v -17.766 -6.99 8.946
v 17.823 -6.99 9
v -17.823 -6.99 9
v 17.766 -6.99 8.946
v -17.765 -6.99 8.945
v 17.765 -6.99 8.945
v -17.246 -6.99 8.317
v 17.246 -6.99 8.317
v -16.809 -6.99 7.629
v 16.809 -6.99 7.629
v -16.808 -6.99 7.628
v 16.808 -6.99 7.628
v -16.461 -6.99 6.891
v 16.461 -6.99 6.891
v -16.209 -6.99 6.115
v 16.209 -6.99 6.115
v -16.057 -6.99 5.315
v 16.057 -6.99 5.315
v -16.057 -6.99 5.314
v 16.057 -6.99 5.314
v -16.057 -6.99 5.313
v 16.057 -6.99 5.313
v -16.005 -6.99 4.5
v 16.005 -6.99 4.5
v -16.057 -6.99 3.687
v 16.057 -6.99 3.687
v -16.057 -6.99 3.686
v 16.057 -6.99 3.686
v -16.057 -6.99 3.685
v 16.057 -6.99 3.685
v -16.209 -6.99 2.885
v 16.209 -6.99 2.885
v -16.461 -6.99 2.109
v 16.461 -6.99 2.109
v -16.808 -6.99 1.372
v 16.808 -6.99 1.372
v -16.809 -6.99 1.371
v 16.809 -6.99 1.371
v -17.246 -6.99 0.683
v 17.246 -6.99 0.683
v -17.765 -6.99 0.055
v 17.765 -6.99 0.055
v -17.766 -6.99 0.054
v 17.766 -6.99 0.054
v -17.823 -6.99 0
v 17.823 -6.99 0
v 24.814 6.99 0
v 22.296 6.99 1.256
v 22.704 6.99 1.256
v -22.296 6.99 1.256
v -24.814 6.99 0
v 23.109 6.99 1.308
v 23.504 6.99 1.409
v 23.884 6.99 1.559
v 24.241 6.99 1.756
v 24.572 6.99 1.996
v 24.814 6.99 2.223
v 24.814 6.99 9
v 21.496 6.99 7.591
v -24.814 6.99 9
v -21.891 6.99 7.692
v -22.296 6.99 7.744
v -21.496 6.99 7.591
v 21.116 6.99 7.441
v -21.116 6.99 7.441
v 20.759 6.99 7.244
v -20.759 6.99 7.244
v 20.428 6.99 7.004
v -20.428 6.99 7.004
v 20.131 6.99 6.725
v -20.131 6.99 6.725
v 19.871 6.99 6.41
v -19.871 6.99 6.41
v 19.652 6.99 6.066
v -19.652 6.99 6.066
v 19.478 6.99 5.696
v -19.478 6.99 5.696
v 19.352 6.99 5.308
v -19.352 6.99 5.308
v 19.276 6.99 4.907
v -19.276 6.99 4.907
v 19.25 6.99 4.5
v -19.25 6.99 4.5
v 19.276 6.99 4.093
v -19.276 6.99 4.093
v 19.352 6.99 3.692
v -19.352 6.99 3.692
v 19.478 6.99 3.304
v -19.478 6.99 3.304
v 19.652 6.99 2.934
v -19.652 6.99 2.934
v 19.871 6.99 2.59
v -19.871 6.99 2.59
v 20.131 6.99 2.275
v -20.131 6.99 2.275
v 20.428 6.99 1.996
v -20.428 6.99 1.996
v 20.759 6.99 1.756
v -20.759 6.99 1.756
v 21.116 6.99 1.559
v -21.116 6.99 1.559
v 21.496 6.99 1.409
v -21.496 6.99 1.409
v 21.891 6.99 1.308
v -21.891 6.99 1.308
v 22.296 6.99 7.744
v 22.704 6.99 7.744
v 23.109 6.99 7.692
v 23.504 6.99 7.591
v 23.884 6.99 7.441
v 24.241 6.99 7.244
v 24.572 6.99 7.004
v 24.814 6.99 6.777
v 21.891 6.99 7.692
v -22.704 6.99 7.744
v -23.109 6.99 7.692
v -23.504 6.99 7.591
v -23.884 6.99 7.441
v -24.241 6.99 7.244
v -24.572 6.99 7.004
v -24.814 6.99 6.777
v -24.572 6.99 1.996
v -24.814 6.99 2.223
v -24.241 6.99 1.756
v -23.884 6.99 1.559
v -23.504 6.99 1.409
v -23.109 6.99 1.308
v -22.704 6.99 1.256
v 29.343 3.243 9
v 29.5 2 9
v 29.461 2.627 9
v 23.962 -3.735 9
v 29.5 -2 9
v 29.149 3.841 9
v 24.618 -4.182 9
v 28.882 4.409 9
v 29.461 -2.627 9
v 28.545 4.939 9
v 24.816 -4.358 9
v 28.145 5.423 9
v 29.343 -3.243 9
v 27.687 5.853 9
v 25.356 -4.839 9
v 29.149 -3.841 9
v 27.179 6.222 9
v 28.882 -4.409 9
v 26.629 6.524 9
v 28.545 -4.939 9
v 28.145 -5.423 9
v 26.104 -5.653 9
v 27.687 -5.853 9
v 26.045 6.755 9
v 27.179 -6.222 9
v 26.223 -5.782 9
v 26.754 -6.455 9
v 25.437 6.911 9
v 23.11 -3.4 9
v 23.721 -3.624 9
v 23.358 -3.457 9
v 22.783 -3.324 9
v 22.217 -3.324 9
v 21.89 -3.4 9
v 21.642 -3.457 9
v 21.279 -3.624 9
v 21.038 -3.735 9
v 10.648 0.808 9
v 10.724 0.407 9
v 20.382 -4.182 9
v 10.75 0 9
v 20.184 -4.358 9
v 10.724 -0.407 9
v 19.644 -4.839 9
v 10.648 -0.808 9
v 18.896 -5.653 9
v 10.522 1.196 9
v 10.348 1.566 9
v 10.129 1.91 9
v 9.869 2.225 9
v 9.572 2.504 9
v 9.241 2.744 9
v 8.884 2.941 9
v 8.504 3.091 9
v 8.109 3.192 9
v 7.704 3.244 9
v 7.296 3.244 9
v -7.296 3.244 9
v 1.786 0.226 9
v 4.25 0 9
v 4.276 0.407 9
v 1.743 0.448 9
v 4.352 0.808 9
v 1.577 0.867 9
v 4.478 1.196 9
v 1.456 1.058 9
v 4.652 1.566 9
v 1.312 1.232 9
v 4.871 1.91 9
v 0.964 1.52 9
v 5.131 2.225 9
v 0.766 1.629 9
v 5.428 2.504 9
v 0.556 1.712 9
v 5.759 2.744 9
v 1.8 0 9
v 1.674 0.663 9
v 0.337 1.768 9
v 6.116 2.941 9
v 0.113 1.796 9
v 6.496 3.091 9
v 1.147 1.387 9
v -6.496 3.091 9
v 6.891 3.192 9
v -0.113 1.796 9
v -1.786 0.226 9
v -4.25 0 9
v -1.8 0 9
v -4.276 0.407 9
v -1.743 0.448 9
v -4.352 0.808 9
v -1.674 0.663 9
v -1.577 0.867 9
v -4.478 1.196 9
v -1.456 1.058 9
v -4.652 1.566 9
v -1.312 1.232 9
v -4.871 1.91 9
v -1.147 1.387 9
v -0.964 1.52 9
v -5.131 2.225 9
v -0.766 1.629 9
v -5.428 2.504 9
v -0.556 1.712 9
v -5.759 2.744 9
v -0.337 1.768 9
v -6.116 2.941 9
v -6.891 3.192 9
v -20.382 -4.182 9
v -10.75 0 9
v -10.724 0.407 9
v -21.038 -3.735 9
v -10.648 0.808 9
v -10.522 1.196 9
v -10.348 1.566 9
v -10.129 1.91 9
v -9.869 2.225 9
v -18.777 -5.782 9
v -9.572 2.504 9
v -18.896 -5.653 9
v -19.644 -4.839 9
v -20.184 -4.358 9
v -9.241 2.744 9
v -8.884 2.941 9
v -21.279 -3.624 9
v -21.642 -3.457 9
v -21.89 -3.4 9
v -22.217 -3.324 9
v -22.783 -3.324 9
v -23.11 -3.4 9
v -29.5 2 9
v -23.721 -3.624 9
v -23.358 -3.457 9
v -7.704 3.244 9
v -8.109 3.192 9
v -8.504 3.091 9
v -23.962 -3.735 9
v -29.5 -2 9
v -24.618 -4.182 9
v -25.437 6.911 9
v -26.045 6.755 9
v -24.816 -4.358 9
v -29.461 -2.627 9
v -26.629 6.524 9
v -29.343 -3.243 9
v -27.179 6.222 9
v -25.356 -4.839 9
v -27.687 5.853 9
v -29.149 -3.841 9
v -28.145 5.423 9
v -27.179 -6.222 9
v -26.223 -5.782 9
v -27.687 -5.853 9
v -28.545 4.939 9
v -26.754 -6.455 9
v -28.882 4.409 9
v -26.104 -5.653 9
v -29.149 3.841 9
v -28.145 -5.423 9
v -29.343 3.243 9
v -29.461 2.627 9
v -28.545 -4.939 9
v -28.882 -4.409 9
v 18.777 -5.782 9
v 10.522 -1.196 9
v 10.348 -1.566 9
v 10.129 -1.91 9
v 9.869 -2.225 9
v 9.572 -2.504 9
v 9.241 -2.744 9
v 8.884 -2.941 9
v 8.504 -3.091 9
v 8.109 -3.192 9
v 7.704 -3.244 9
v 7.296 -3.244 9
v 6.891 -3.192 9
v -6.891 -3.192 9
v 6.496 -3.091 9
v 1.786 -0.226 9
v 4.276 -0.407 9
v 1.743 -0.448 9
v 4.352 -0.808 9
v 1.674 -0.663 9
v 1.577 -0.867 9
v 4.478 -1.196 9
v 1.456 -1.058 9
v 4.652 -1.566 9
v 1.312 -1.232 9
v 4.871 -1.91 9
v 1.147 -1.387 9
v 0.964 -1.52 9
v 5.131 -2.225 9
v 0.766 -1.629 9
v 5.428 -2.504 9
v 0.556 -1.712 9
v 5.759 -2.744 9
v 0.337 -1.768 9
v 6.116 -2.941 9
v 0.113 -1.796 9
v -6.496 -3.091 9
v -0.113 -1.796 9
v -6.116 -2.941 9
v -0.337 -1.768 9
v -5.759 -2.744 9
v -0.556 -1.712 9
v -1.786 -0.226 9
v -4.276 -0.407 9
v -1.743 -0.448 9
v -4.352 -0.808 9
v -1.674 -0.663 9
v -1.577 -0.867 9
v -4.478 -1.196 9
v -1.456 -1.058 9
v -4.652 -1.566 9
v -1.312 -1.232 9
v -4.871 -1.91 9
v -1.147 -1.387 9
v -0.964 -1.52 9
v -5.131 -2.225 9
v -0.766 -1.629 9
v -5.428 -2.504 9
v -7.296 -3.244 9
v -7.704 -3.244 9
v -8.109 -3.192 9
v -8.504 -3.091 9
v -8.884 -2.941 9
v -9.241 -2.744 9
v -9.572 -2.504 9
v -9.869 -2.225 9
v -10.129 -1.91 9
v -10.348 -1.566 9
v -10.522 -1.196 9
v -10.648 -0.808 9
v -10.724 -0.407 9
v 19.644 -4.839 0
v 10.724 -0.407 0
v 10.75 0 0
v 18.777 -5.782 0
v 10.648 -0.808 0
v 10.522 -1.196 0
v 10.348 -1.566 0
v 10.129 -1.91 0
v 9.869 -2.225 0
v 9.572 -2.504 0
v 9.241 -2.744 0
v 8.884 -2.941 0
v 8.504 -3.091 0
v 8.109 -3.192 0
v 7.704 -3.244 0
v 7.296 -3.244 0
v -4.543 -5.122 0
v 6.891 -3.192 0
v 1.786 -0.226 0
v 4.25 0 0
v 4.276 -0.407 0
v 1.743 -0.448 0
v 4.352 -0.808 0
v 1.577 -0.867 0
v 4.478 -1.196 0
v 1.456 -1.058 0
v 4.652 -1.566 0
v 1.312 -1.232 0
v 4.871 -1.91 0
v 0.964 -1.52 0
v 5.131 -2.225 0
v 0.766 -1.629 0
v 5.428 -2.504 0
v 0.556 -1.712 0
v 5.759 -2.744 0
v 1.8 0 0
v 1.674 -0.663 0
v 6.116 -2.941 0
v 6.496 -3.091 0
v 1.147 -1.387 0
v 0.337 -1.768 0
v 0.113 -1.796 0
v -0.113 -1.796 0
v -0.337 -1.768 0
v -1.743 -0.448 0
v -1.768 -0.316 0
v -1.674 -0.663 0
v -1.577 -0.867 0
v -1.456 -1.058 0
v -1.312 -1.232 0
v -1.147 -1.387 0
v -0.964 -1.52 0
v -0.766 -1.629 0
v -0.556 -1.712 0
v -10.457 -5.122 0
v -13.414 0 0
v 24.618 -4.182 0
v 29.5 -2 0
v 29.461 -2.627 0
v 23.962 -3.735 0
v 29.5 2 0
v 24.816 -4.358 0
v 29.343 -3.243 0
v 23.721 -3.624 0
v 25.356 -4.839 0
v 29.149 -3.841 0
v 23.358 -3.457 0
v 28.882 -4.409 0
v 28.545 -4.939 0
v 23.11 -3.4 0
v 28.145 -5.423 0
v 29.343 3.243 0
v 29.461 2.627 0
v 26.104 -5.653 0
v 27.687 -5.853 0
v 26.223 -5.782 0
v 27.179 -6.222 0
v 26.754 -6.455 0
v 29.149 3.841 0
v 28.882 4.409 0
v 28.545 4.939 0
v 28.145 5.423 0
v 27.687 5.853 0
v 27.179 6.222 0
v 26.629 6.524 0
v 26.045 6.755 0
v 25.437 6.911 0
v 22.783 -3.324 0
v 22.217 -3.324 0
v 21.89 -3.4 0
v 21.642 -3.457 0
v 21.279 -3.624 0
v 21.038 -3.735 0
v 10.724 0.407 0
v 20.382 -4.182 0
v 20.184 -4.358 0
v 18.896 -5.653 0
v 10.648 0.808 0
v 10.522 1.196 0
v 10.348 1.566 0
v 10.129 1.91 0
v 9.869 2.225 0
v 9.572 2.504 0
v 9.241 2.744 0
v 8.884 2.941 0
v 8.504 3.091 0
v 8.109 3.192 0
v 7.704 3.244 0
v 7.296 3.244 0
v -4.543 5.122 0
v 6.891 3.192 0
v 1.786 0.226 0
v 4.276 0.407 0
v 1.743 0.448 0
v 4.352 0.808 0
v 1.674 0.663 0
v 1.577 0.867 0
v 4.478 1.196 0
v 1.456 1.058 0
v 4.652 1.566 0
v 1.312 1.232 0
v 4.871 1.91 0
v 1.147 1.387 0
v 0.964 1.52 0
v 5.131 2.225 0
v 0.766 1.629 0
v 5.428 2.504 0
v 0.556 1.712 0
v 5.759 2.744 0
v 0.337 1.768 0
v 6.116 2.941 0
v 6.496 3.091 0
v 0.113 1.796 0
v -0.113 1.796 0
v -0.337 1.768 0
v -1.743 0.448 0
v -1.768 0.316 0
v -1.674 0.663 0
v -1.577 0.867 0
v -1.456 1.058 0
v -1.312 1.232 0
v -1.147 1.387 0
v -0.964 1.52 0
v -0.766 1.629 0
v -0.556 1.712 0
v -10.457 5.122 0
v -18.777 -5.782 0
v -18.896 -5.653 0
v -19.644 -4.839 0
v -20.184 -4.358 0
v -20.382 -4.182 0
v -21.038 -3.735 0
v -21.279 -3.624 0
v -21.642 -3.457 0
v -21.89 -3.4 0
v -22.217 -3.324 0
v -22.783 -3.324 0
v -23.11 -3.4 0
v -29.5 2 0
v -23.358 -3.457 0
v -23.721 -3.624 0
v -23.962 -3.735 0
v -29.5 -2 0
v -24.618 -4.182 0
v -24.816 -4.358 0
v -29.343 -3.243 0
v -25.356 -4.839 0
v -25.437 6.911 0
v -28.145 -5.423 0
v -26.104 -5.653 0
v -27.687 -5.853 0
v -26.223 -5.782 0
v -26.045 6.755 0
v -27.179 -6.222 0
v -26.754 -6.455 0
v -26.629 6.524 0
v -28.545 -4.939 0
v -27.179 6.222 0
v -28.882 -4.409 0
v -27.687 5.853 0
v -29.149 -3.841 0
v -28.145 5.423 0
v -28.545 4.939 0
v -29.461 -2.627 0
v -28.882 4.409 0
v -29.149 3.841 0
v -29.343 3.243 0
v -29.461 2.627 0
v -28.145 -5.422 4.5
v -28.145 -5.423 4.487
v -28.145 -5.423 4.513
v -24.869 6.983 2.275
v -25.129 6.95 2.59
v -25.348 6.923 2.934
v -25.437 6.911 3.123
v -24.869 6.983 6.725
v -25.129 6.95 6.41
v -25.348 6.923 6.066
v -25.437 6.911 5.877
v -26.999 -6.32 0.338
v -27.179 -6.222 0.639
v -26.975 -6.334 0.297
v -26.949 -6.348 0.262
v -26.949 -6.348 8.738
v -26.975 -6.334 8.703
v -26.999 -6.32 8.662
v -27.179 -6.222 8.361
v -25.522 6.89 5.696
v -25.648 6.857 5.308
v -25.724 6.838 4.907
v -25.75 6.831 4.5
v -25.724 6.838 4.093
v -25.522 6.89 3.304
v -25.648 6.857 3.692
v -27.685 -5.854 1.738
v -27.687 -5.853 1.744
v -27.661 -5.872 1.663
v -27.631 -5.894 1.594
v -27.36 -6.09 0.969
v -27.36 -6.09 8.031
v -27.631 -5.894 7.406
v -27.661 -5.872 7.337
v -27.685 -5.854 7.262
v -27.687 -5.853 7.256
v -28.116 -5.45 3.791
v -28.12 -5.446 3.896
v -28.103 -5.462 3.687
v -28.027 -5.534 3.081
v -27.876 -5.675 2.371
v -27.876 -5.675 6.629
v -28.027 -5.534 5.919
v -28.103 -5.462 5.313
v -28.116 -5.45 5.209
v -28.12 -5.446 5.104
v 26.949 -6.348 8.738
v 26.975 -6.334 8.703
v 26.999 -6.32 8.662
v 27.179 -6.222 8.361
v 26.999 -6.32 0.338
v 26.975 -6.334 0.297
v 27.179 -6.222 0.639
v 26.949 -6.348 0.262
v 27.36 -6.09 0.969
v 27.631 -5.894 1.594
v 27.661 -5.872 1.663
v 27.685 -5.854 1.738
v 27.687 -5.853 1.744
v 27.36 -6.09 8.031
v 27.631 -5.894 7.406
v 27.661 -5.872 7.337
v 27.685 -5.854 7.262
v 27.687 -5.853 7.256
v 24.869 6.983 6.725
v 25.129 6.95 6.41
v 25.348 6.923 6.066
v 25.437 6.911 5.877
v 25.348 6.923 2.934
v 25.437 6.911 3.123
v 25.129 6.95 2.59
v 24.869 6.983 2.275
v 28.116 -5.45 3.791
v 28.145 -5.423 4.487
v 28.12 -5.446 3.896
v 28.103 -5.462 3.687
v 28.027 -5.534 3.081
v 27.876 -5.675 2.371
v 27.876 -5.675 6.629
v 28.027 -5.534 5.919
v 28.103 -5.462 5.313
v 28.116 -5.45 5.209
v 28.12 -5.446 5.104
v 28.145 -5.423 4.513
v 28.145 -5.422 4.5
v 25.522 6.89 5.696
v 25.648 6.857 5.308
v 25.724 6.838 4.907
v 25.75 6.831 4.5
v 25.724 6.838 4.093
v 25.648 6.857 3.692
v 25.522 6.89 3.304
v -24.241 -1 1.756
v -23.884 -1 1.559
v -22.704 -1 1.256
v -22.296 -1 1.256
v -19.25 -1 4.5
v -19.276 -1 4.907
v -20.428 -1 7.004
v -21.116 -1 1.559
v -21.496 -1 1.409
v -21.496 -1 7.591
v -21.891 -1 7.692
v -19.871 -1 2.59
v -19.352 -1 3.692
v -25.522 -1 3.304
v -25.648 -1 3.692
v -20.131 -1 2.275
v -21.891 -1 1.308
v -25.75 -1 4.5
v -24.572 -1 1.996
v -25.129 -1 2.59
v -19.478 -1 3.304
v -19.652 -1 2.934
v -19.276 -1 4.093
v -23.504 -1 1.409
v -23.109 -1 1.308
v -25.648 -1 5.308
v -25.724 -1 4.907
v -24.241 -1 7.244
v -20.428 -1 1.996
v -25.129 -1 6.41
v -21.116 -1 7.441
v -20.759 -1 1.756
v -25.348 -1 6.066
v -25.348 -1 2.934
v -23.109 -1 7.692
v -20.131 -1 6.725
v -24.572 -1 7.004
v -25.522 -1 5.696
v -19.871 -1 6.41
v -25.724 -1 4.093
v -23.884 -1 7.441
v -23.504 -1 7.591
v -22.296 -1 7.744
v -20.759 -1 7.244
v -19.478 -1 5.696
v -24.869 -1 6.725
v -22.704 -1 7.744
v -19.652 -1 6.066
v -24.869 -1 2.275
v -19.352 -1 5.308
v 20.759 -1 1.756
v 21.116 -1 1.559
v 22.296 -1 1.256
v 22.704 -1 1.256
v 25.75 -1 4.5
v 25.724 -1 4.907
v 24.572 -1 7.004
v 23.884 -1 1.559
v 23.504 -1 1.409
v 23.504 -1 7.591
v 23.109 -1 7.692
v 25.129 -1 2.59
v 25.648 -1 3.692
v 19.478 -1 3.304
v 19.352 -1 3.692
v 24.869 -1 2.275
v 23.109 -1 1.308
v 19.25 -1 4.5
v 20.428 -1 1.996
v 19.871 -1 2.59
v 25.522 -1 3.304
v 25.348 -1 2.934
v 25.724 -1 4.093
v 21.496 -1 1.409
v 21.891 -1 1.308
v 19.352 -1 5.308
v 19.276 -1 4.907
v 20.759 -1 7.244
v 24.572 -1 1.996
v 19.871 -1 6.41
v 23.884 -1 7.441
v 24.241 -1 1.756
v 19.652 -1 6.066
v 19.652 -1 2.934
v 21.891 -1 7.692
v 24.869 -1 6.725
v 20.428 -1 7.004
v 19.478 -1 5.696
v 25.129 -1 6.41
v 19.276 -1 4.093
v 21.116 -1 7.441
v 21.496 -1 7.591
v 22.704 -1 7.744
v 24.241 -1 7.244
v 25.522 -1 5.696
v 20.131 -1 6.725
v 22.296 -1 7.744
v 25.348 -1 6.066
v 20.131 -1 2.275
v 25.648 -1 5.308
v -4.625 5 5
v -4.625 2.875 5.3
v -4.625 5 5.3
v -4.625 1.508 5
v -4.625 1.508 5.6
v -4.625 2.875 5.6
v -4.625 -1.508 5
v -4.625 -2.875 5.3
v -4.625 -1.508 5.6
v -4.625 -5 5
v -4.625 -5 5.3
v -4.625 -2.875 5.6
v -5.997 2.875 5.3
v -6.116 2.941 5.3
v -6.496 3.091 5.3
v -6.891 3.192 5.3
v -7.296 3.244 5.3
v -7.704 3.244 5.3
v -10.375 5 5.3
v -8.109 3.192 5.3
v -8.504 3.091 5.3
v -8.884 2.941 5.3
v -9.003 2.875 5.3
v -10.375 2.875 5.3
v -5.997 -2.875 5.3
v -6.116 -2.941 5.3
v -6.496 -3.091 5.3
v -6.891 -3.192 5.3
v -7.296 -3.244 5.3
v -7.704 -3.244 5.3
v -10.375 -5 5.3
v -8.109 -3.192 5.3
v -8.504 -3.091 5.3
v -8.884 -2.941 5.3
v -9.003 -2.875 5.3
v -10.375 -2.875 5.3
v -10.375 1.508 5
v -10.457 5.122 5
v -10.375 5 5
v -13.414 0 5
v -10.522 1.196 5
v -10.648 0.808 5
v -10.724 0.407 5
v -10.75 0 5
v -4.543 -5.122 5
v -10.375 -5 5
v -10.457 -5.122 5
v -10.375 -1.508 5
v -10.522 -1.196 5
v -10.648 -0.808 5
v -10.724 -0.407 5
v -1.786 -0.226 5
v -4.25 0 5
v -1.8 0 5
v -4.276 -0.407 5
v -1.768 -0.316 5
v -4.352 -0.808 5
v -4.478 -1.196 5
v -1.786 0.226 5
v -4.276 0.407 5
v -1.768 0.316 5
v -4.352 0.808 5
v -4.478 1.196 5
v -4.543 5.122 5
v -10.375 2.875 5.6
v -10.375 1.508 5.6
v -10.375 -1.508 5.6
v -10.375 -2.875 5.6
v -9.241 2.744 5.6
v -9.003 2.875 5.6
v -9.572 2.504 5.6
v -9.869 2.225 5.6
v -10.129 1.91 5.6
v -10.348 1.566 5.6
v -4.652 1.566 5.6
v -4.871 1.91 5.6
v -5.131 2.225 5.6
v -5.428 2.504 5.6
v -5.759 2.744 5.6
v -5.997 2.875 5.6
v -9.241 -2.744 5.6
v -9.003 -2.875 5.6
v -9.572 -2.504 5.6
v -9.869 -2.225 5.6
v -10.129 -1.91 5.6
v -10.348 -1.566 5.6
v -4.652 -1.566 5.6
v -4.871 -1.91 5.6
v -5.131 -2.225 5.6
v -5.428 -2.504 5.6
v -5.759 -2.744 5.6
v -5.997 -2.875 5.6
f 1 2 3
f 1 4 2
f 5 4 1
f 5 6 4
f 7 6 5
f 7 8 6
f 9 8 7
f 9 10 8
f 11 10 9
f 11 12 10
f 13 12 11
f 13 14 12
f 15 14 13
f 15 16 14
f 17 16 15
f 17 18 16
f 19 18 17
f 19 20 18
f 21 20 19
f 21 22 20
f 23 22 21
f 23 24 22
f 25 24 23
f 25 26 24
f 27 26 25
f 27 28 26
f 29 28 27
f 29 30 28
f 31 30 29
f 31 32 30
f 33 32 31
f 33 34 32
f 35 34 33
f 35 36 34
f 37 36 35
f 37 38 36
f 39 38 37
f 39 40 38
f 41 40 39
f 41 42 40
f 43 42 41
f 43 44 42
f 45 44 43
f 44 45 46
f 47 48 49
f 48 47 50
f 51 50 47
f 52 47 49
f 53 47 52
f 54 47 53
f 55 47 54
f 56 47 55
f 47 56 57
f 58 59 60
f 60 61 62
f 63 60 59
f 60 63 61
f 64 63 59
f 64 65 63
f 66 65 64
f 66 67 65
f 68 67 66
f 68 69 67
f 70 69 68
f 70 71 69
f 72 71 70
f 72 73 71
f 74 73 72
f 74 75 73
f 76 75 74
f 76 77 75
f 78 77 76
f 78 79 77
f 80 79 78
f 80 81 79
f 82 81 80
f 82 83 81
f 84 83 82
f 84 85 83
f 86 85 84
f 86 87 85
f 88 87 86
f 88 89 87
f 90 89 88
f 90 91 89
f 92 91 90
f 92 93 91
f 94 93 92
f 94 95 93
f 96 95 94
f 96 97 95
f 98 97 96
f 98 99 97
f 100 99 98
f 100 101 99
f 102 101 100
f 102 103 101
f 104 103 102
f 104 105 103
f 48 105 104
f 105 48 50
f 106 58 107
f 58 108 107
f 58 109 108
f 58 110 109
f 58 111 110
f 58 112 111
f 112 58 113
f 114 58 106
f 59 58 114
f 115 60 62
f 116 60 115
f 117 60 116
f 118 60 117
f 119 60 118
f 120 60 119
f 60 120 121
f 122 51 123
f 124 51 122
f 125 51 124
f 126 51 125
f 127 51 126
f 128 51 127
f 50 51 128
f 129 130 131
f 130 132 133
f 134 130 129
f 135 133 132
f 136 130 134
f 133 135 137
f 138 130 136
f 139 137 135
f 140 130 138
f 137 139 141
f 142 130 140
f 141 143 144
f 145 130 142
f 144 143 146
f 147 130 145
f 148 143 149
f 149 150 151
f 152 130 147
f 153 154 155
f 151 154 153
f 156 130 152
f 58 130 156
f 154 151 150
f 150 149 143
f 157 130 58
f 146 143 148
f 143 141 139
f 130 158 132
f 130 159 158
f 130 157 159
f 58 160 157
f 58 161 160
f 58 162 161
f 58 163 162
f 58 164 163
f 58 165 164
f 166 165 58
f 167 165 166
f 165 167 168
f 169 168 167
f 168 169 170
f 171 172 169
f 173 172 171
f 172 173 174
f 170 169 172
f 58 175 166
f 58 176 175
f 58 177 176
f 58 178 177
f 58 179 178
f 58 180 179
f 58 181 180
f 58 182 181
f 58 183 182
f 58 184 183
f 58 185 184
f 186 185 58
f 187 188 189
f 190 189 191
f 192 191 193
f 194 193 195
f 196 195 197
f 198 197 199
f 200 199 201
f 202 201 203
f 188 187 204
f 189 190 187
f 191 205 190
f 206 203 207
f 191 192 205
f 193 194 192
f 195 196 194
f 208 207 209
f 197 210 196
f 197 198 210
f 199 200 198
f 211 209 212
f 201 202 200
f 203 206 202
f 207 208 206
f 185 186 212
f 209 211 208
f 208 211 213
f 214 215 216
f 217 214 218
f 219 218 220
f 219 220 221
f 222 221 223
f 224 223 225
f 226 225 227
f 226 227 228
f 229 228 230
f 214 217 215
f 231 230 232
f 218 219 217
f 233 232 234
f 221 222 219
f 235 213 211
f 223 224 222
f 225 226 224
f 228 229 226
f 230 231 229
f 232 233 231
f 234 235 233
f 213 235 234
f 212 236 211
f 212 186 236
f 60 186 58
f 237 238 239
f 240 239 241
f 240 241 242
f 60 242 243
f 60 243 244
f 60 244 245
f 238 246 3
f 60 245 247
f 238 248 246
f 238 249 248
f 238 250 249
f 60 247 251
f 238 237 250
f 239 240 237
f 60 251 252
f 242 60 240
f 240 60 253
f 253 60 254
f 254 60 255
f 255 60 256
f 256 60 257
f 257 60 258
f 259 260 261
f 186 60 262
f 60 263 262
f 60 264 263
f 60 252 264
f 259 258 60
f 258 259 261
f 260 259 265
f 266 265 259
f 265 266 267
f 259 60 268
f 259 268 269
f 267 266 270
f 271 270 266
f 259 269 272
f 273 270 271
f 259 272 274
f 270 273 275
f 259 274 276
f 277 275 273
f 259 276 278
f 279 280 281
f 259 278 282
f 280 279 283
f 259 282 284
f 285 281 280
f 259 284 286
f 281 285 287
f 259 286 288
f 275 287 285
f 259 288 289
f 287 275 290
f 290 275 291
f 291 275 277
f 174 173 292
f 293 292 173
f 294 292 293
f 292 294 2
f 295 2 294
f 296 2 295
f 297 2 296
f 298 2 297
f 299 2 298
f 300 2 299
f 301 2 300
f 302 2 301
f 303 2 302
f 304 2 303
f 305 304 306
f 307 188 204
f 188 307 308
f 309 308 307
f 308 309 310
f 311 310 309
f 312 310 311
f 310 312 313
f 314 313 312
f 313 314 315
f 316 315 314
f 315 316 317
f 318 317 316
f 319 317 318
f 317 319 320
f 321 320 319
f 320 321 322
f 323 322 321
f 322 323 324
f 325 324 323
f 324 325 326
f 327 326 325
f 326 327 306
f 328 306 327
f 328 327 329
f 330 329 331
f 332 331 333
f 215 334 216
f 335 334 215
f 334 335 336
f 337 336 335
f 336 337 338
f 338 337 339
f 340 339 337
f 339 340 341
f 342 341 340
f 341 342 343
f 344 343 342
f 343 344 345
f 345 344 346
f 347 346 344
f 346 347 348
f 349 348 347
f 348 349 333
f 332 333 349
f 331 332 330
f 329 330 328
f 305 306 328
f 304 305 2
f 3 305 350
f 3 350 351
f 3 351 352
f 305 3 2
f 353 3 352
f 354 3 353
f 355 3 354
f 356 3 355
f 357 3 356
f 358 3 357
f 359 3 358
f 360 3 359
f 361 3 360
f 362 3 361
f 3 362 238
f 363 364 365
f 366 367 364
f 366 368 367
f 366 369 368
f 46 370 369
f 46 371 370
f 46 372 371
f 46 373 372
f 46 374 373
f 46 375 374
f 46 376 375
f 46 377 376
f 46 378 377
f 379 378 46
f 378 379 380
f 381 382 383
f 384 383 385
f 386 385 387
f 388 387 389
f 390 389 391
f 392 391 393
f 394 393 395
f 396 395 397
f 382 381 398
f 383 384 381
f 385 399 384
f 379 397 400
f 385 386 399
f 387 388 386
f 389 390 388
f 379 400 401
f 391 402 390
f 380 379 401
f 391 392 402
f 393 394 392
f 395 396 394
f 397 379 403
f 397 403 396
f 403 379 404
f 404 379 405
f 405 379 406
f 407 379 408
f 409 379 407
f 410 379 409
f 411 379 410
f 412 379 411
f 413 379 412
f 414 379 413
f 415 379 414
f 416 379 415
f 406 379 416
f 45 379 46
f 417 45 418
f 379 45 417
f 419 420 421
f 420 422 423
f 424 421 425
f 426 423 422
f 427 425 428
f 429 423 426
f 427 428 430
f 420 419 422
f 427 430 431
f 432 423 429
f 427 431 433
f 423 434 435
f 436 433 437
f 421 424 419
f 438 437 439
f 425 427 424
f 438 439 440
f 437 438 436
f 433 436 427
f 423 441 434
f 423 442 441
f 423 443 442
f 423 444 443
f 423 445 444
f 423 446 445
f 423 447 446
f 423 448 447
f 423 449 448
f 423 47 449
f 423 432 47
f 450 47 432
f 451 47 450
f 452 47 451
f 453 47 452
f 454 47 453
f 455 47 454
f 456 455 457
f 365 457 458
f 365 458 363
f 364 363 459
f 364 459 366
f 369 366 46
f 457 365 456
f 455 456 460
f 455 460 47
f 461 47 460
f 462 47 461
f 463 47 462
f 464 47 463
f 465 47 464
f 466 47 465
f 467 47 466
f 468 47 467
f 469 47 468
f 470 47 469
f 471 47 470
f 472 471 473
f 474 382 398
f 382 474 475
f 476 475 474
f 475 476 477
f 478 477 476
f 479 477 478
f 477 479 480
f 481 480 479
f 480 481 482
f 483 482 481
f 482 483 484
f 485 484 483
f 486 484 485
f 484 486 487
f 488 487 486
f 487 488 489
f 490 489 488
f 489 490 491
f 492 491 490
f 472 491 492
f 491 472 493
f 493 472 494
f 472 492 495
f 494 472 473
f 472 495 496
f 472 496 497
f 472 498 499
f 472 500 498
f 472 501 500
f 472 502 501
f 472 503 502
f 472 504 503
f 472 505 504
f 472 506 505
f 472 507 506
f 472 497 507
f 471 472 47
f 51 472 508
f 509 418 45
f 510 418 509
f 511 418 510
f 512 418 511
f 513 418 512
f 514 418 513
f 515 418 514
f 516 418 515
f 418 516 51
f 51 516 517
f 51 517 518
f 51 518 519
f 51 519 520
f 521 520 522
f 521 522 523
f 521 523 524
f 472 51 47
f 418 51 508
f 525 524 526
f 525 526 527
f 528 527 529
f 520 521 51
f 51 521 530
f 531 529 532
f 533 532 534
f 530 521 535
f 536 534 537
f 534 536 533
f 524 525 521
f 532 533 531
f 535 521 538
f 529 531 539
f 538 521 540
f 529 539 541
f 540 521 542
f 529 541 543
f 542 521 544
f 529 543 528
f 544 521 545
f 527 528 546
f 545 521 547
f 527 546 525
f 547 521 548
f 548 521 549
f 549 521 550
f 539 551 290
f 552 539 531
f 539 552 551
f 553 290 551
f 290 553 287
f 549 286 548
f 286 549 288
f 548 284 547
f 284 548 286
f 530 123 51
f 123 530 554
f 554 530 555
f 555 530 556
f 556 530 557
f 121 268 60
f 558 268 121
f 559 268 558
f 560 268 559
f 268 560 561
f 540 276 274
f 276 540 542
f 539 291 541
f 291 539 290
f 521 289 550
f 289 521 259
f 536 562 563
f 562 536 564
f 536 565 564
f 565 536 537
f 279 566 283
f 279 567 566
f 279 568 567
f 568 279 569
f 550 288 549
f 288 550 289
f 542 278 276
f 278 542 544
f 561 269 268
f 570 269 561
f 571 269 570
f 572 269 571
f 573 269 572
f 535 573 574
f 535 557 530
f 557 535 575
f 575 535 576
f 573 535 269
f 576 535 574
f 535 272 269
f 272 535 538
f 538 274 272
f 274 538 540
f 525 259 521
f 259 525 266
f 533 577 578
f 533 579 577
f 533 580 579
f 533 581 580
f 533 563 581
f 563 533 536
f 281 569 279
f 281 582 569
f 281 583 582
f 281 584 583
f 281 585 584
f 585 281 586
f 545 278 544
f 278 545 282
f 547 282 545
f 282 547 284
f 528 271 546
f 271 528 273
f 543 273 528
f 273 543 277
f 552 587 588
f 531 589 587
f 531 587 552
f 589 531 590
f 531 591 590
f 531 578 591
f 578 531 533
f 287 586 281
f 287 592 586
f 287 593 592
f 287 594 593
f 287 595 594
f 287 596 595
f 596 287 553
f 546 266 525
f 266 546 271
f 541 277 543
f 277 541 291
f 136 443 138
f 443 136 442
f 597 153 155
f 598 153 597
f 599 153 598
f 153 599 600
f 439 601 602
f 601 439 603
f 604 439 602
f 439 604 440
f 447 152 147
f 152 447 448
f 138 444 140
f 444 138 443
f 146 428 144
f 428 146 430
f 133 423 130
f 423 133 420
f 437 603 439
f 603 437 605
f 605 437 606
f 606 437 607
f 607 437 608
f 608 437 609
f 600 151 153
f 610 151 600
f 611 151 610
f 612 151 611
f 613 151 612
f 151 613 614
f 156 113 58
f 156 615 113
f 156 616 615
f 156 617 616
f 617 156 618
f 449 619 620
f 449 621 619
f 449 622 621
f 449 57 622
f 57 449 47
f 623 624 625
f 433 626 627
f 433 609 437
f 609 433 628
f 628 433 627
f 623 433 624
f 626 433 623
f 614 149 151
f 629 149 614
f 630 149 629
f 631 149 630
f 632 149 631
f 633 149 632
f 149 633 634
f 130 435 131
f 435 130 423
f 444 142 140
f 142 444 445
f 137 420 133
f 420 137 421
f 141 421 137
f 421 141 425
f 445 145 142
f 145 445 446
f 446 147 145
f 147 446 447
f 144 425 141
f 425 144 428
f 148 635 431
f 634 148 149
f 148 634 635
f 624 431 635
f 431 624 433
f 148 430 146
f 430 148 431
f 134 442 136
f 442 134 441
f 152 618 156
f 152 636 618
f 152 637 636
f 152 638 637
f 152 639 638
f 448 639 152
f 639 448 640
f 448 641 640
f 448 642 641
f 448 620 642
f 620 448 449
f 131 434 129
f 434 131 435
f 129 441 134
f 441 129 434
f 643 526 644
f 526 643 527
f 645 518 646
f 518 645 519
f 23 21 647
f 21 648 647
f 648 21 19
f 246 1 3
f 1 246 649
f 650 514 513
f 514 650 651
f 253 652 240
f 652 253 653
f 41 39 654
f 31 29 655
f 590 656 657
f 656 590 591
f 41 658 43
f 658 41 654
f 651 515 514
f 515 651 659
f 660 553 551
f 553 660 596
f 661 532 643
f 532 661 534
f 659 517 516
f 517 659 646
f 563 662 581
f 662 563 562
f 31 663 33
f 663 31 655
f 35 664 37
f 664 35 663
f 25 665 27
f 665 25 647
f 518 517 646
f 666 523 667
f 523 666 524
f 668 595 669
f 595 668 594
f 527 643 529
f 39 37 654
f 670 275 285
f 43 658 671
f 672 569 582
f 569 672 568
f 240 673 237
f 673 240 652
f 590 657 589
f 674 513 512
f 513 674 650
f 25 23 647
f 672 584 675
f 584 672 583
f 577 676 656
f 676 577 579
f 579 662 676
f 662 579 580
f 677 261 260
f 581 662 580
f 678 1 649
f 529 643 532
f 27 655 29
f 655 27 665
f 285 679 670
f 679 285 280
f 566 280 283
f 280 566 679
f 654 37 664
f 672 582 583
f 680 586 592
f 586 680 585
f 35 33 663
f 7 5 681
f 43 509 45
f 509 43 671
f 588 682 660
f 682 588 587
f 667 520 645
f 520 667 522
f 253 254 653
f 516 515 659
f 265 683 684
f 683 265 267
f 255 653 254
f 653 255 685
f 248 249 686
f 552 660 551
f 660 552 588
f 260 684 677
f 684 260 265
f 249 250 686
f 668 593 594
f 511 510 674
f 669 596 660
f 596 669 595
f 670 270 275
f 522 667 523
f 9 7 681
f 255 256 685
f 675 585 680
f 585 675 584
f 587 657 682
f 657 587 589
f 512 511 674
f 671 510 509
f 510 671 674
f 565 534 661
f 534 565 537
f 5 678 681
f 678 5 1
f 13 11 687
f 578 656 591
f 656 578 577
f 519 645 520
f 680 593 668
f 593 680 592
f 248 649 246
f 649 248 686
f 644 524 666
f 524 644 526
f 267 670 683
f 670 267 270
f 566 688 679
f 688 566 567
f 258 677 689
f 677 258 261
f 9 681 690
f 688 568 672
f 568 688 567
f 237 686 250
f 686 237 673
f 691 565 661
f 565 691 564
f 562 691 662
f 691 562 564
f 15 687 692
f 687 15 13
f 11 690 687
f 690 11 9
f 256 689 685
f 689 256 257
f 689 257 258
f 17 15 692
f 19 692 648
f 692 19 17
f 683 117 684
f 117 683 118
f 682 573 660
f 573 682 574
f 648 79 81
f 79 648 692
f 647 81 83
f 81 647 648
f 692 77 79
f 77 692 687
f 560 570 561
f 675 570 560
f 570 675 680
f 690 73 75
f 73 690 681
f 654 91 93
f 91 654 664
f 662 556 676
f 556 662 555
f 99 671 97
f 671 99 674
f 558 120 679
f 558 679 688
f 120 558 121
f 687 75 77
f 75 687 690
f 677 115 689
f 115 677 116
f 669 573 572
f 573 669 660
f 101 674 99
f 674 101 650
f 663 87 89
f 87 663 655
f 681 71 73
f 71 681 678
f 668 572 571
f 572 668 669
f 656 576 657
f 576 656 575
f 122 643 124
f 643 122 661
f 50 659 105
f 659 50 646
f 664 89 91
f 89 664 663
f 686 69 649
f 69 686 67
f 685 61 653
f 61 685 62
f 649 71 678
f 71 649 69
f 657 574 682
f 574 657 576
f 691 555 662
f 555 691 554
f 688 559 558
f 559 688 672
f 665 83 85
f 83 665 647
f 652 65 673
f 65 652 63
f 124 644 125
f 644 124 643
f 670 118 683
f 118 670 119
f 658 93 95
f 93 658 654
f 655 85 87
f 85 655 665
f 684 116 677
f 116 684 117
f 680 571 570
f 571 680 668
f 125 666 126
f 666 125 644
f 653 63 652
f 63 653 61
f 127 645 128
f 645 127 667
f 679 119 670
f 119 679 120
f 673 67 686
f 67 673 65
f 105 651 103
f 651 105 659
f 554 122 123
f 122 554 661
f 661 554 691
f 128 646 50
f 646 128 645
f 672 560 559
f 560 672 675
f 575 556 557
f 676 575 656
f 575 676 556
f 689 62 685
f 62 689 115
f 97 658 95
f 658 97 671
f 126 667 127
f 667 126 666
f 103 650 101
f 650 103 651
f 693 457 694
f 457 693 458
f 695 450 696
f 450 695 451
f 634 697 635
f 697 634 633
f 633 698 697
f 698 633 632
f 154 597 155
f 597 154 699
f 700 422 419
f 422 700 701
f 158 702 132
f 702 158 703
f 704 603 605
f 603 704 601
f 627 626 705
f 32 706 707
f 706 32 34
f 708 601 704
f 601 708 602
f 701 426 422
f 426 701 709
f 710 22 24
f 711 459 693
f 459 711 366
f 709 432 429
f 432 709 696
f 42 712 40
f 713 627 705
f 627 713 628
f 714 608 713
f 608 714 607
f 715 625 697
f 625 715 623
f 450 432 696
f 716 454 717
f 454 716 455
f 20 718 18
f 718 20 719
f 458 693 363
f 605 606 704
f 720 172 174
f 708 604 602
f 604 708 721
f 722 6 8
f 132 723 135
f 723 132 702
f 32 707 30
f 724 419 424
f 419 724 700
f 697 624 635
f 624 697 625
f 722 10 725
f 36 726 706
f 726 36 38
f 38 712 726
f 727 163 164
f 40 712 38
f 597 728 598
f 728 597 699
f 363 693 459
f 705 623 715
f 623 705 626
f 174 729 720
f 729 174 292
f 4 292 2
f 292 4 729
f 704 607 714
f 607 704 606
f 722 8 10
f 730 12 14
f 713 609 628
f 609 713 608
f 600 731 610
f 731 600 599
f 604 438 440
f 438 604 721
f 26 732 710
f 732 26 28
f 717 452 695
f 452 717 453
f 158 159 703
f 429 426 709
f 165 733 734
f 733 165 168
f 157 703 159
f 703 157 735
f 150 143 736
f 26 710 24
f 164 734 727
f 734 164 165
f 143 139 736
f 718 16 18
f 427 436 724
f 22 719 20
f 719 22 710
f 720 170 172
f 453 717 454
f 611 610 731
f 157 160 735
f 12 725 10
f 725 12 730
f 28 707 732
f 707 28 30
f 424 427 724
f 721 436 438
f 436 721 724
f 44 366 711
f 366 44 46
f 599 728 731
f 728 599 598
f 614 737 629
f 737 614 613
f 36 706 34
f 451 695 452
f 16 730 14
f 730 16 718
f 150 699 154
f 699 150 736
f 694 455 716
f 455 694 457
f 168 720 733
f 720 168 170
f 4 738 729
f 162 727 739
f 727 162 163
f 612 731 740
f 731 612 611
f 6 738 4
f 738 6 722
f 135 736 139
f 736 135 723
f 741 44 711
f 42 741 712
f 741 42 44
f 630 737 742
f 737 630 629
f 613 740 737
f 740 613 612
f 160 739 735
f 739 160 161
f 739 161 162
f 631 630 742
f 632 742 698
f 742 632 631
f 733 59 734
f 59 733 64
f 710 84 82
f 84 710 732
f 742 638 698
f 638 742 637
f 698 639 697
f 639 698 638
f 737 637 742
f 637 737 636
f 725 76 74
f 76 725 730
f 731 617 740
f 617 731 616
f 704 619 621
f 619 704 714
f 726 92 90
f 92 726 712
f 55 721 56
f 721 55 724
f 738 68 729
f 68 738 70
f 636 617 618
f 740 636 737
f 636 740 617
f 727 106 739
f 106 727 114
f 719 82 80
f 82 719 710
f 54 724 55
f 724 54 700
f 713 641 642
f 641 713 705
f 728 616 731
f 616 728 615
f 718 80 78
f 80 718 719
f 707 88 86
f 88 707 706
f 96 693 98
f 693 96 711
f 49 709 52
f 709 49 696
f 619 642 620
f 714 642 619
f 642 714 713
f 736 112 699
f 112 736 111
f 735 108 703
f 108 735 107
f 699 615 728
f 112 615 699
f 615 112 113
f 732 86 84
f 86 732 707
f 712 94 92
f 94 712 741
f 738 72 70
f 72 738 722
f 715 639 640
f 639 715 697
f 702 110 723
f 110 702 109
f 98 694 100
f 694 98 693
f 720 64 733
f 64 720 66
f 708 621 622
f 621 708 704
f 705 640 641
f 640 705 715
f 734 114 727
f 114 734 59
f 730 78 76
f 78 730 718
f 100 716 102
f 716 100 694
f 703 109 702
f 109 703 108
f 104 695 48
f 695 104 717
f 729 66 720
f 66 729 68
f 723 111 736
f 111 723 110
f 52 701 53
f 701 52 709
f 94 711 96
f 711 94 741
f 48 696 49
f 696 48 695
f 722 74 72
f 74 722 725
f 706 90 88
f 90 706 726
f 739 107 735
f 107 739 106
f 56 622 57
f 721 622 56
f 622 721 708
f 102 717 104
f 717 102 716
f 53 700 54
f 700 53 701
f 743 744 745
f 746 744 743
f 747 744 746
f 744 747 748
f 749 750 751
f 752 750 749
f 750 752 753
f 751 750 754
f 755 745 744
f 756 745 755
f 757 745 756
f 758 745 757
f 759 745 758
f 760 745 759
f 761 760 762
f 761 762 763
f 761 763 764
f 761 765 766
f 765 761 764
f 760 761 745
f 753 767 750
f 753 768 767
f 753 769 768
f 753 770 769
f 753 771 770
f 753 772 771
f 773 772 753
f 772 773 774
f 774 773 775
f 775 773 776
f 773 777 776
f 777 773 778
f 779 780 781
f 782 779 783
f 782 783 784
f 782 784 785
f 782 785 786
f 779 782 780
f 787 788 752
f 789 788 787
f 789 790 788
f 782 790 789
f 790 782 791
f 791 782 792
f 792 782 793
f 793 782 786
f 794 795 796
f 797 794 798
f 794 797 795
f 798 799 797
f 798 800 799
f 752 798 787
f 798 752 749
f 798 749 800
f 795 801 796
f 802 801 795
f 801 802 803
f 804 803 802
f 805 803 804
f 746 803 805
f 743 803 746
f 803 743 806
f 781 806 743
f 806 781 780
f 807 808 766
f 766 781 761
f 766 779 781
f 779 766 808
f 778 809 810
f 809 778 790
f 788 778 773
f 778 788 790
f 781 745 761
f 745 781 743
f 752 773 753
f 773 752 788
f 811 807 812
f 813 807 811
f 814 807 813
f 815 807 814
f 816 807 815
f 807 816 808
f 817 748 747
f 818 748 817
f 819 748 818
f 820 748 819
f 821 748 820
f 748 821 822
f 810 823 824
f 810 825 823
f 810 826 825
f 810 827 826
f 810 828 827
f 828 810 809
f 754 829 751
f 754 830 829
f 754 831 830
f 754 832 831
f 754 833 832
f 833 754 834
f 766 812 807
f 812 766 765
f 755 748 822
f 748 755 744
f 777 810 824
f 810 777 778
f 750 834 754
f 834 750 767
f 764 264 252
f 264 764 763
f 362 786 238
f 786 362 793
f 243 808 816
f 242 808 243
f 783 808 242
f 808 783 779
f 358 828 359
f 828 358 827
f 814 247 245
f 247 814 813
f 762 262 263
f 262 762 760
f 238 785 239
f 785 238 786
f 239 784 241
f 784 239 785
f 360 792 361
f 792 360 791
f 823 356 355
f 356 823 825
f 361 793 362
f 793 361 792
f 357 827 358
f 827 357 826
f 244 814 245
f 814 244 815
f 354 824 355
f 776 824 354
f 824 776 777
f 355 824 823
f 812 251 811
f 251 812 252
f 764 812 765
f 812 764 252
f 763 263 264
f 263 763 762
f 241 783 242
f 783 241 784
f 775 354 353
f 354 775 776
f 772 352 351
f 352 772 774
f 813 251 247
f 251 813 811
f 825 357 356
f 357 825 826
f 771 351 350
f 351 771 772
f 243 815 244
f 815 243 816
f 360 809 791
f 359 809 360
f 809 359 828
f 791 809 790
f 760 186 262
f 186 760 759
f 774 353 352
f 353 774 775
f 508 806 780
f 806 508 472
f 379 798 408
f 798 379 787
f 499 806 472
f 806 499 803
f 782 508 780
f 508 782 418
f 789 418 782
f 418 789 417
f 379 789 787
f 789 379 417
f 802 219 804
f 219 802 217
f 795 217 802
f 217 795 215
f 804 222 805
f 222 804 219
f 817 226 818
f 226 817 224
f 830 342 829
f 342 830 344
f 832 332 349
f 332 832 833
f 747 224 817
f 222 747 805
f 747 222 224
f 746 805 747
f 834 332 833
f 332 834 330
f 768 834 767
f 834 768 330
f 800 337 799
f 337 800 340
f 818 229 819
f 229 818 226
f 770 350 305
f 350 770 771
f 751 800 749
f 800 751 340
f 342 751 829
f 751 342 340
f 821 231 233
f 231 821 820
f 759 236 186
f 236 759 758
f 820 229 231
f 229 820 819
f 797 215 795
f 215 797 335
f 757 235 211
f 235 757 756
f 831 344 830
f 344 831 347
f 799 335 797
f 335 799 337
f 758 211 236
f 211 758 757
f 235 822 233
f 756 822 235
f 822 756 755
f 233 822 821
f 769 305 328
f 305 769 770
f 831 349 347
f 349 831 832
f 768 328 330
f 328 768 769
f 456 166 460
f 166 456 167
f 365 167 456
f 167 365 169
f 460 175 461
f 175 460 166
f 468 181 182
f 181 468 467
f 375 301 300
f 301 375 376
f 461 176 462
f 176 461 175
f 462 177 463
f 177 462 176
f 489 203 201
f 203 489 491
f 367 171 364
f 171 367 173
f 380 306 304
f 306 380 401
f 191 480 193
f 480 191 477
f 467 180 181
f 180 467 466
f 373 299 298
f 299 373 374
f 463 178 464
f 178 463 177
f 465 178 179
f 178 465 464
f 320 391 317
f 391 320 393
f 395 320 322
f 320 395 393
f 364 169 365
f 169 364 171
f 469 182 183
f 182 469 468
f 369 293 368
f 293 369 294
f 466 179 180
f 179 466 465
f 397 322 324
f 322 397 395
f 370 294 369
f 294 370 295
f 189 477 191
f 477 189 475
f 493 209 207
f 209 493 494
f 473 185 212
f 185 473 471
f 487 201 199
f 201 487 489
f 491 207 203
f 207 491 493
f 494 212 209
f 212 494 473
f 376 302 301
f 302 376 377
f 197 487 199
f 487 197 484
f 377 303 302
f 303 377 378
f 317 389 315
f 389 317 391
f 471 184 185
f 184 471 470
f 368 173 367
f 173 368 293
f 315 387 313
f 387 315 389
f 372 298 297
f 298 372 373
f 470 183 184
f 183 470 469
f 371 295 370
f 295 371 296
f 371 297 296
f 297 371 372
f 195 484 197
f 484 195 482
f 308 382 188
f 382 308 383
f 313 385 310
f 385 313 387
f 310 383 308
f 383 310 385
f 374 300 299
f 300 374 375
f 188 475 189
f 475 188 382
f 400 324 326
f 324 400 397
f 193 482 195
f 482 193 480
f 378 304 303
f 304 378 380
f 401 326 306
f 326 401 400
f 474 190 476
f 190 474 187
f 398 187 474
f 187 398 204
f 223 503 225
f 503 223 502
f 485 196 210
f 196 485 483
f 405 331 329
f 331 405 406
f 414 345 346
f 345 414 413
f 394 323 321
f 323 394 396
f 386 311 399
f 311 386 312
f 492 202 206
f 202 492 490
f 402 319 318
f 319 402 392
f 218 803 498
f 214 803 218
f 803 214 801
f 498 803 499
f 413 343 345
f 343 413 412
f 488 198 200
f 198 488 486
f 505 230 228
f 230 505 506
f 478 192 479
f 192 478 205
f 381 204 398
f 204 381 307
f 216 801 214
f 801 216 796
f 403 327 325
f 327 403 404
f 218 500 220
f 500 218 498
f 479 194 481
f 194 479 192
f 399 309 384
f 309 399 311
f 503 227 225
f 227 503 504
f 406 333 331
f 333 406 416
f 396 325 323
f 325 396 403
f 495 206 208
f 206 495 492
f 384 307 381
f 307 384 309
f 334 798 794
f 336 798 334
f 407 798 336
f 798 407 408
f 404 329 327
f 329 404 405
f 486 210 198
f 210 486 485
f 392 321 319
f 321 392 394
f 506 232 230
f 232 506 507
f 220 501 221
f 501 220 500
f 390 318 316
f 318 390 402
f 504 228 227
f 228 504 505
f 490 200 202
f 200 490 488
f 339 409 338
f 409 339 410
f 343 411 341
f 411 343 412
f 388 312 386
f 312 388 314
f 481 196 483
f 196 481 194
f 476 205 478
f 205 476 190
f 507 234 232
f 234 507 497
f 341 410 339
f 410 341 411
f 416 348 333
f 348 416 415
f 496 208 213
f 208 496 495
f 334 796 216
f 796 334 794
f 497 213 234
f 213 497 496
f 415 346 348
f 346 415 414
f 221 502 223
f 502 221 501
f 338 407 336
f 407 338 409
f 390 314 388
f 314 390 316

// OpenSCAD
$fn = 50;


difference() {
	union() {
		hull() {
			translate(v = [-9.5000000000, 2.0000000000, 0]) {
				cylinder(h = 9, r = 5);
			}
			translate(v = [9.5000000000, 2.0000000000, 0]) {
				cylinder(h = 9, r = 5);
			}
			translate(v = [-9.5000000000, -2.0000000000, 0]) {
				cylinder(h = 9, r = 5);
			}
			translate(v = [9.5000000000, -2.0000000000, 0]) {
				cylinder(h = 9, r = 5);
			}
		}
		translate(v = [-15.0000000000, 0.0000000000, 0]) {
			hull() {
				translate(v = [-9.5000000000, 2.0000000000, 0]) {
					cylinder(h = 9, r = 5);
				}
				translate(v = [9.5000000000, 2.0000000000, 0]) {
					cylinder(h = 9, r = 5);
				}
				translate(v = [-9.5000000000, -2.0000000000, 0]) {
					cylinder(h = 9, r = 5);
				}
				translate(v = [9.5000000000, -2.0000000000, 0]) {
					cylinder(h = 9, r = 5);
				}
			}
		}
		translate(v = [15.0000000000, 0.0000000000, 0]) {
			hull() {
				translate(v = [-9.5000000000, 2.0000000000, 0]) {
					cylinder(h = 9, r = 5);
				}
				translate(v = [9.5000000000, 2.0000000000, 0]) {
					cylinder(h = 9, r = 5);
				}
				translate(v = [-9.5000000000, -2.0000000000, 0]) {
					cylinder(h = 9, r = 5);
				}
				translate(v = [9.5000000000, -2.0000000000, 0]) {
					cylinder(h = 9, r = 5);
				}
			}
		}
	}
	union() {
		translate(v = [-22.5000000000, -7.0000000000, 4.5000000000]) {
			rotate(a = [90, 0, 0]) {
				difference() {
					union() {
						#translate(v = [0, 0, -14.0000000000]) {
							cylinder(h = 14, r = 2.2500000000);
						}
						#translate(v = [0, 0, -6]) {
							cylinder(h = 6, r1 = 3.2500000000, r2 = 6.5000000000);
						}
						#translate(v = [0, 0, -14.0000000000]) {
							cylinder(h = 14, r = 3.2500000000);
						}
						#translate(v = [0, 0, -14.0000000000]) {
							cylinder(h = 14, r = 2.2500000000);
						}
					}
					union();
				}
			}
		}
		translate(v = [22.5000000000, -7.0000000000, 4.5000000000]) {
			rotate(a = [90, 0, 0]) {
				difference() {
					union() {
						#translate(v = [0, 0, -14.0000000000]) {
							cylinder(h = 14, r = 2.2500000000);
						}
						#translate(v = [0, 0, -6]) {
							cylinder(h = 6, r1 = 3.2500000000, r2 = 6.5000000000);
						}
						#translate(v = [0, 0, -14.0000000000]) {
							cylinder(h = 14, r = 3.2500000000);
						}
						#translate(v = [0, 0, -14.0000000000]) {
							cylinder(h = 14, r = 2.2500000000);
						}
					}
					union();
				}
			}
		}
		translate(v = [-7.5000000000, 0.0000000000, 0]) {
			rotate(a = [0, 0, 0]) {
				difference() {
					union() {
						#translate(v = [-2.8750000000, -5.0000000000, -0.3000000000]) {
							cube(size = [5.7500000000, 10, 0.3000000000]);
						}
						#translate(v = [-2.8750000000, -2.8750000000, -0.6000000000]) {
							cube(size = [5.7500000000, 5.7500000000, 0.3000000000]);
						}
						#translate(v = [-2.8750000000, -5.0000000000, 5]) {
							cube(size = [5.7500000000, 10, 0.3000000000]);
						}
						#translate(v = [-2.8750000000, -2.8750000000, 5.3000000000]) {
							cube(size = [5.7500000000, 5.7500000000, 0.3000000000]);
						}
						#translate(v = [0, 0, -100.0000000000]) {
							cylinder(h = 200, r = 3.2500000000);
						}
						#linear_extrude(height = 5) {
							polygon(points = [[5.9142500000, 0.0000000000], [2.9571250000, 5.1218907443], [-2.9571250000, 5.1218907443], [-5.9142500000, 0.0000000000], [-2.9571250000, -5.1218907443], [2.9571250000, -5.1218907443]]);
						}
						#translate(v = [-2.8750000000, -5.0000000000, -0.3000000000]) {
							cube(size = [5.7500000000, 10, 0.3000000000]);
						}
						#translate(v = [-2.8750000000, -2.8750000000, -0.6000000000]) {
							cube(size = [5.7500000000, 5.7500000000, 0.3000000000]);
						}
						#translate(v = [-2.8750000000, -5.0000000000, 5]) {
							cube(size = [5.7500000000, 10, 0.3000000000]);
						}
						#translate(v = [-2.8750000000, -2.8750000000, 5.3000000000]) {
							cube(size = [5.7500000000, 5.7500000000, 0.3000000000]);
						}
						#translate(v = [0, 0, -100.0000000000]) {
							cylinder(h = 200, r = 3.2500000000);
						}
						#translate(v = [-2.8750000000, -5.0000000000, -0.3000000000]) {
							cube(size = [5.7500000000, 10, 0.3000000000]);
						}
						#translate(v = [-2.8750000000, -2.8750000000, -0.6000000000]) {
							cube(size = [5.7500000000, 5.7500000000, 0.3000000000]);
						}
						#translate(v = [-2.8750000000, -5.0000000000, 5]) {
							cube(size = [5.7500000000, 10, 0.3000000000]);
						}
						#translate(v = [-2.8750000000, -2.8750000000, 5.3000000000]) {
							cube(size = [5.7500000000, 5.7500000000, 0.3000000000]);
						}
						#translate(v = [0, 0, -100.0000000000]) {
							cylinder(h = 200, r = 3.2500000000);
						}
					}
					union();
				}
			}
		}
		translate(v = [-7.5000000000, 0.0000000000, 0]) {
			translate(v = [0, 0, -100]) {
				cylinder(h = 200, r = 3.2500000000);
			}
		}
		translate(v = [7.5000000000, 0.0000000000, 0]) {
			translate(v = [0, 0, -100]) {
				cylinder(h = 200, r = 3.2500000000);
			}
		}
		translate(v = [-7.5000000000, 0.0000000000, 0]) {
			translate(v = [0, 0, -100]) {
				cylinder(h = 200, r = 1.8000000000);
			}
		}
		translate(v = [0, 0, -100]) {
			cylinder(h = 200, r = 1.8000000000);
		}
		translate(v = [7.5000000000, 0.0000000000, 0]) {
			translate(v = [0, 0, -100]) {
				cylinder(h = 200, r = 1.8000000000);
			}
		}
	}
}
